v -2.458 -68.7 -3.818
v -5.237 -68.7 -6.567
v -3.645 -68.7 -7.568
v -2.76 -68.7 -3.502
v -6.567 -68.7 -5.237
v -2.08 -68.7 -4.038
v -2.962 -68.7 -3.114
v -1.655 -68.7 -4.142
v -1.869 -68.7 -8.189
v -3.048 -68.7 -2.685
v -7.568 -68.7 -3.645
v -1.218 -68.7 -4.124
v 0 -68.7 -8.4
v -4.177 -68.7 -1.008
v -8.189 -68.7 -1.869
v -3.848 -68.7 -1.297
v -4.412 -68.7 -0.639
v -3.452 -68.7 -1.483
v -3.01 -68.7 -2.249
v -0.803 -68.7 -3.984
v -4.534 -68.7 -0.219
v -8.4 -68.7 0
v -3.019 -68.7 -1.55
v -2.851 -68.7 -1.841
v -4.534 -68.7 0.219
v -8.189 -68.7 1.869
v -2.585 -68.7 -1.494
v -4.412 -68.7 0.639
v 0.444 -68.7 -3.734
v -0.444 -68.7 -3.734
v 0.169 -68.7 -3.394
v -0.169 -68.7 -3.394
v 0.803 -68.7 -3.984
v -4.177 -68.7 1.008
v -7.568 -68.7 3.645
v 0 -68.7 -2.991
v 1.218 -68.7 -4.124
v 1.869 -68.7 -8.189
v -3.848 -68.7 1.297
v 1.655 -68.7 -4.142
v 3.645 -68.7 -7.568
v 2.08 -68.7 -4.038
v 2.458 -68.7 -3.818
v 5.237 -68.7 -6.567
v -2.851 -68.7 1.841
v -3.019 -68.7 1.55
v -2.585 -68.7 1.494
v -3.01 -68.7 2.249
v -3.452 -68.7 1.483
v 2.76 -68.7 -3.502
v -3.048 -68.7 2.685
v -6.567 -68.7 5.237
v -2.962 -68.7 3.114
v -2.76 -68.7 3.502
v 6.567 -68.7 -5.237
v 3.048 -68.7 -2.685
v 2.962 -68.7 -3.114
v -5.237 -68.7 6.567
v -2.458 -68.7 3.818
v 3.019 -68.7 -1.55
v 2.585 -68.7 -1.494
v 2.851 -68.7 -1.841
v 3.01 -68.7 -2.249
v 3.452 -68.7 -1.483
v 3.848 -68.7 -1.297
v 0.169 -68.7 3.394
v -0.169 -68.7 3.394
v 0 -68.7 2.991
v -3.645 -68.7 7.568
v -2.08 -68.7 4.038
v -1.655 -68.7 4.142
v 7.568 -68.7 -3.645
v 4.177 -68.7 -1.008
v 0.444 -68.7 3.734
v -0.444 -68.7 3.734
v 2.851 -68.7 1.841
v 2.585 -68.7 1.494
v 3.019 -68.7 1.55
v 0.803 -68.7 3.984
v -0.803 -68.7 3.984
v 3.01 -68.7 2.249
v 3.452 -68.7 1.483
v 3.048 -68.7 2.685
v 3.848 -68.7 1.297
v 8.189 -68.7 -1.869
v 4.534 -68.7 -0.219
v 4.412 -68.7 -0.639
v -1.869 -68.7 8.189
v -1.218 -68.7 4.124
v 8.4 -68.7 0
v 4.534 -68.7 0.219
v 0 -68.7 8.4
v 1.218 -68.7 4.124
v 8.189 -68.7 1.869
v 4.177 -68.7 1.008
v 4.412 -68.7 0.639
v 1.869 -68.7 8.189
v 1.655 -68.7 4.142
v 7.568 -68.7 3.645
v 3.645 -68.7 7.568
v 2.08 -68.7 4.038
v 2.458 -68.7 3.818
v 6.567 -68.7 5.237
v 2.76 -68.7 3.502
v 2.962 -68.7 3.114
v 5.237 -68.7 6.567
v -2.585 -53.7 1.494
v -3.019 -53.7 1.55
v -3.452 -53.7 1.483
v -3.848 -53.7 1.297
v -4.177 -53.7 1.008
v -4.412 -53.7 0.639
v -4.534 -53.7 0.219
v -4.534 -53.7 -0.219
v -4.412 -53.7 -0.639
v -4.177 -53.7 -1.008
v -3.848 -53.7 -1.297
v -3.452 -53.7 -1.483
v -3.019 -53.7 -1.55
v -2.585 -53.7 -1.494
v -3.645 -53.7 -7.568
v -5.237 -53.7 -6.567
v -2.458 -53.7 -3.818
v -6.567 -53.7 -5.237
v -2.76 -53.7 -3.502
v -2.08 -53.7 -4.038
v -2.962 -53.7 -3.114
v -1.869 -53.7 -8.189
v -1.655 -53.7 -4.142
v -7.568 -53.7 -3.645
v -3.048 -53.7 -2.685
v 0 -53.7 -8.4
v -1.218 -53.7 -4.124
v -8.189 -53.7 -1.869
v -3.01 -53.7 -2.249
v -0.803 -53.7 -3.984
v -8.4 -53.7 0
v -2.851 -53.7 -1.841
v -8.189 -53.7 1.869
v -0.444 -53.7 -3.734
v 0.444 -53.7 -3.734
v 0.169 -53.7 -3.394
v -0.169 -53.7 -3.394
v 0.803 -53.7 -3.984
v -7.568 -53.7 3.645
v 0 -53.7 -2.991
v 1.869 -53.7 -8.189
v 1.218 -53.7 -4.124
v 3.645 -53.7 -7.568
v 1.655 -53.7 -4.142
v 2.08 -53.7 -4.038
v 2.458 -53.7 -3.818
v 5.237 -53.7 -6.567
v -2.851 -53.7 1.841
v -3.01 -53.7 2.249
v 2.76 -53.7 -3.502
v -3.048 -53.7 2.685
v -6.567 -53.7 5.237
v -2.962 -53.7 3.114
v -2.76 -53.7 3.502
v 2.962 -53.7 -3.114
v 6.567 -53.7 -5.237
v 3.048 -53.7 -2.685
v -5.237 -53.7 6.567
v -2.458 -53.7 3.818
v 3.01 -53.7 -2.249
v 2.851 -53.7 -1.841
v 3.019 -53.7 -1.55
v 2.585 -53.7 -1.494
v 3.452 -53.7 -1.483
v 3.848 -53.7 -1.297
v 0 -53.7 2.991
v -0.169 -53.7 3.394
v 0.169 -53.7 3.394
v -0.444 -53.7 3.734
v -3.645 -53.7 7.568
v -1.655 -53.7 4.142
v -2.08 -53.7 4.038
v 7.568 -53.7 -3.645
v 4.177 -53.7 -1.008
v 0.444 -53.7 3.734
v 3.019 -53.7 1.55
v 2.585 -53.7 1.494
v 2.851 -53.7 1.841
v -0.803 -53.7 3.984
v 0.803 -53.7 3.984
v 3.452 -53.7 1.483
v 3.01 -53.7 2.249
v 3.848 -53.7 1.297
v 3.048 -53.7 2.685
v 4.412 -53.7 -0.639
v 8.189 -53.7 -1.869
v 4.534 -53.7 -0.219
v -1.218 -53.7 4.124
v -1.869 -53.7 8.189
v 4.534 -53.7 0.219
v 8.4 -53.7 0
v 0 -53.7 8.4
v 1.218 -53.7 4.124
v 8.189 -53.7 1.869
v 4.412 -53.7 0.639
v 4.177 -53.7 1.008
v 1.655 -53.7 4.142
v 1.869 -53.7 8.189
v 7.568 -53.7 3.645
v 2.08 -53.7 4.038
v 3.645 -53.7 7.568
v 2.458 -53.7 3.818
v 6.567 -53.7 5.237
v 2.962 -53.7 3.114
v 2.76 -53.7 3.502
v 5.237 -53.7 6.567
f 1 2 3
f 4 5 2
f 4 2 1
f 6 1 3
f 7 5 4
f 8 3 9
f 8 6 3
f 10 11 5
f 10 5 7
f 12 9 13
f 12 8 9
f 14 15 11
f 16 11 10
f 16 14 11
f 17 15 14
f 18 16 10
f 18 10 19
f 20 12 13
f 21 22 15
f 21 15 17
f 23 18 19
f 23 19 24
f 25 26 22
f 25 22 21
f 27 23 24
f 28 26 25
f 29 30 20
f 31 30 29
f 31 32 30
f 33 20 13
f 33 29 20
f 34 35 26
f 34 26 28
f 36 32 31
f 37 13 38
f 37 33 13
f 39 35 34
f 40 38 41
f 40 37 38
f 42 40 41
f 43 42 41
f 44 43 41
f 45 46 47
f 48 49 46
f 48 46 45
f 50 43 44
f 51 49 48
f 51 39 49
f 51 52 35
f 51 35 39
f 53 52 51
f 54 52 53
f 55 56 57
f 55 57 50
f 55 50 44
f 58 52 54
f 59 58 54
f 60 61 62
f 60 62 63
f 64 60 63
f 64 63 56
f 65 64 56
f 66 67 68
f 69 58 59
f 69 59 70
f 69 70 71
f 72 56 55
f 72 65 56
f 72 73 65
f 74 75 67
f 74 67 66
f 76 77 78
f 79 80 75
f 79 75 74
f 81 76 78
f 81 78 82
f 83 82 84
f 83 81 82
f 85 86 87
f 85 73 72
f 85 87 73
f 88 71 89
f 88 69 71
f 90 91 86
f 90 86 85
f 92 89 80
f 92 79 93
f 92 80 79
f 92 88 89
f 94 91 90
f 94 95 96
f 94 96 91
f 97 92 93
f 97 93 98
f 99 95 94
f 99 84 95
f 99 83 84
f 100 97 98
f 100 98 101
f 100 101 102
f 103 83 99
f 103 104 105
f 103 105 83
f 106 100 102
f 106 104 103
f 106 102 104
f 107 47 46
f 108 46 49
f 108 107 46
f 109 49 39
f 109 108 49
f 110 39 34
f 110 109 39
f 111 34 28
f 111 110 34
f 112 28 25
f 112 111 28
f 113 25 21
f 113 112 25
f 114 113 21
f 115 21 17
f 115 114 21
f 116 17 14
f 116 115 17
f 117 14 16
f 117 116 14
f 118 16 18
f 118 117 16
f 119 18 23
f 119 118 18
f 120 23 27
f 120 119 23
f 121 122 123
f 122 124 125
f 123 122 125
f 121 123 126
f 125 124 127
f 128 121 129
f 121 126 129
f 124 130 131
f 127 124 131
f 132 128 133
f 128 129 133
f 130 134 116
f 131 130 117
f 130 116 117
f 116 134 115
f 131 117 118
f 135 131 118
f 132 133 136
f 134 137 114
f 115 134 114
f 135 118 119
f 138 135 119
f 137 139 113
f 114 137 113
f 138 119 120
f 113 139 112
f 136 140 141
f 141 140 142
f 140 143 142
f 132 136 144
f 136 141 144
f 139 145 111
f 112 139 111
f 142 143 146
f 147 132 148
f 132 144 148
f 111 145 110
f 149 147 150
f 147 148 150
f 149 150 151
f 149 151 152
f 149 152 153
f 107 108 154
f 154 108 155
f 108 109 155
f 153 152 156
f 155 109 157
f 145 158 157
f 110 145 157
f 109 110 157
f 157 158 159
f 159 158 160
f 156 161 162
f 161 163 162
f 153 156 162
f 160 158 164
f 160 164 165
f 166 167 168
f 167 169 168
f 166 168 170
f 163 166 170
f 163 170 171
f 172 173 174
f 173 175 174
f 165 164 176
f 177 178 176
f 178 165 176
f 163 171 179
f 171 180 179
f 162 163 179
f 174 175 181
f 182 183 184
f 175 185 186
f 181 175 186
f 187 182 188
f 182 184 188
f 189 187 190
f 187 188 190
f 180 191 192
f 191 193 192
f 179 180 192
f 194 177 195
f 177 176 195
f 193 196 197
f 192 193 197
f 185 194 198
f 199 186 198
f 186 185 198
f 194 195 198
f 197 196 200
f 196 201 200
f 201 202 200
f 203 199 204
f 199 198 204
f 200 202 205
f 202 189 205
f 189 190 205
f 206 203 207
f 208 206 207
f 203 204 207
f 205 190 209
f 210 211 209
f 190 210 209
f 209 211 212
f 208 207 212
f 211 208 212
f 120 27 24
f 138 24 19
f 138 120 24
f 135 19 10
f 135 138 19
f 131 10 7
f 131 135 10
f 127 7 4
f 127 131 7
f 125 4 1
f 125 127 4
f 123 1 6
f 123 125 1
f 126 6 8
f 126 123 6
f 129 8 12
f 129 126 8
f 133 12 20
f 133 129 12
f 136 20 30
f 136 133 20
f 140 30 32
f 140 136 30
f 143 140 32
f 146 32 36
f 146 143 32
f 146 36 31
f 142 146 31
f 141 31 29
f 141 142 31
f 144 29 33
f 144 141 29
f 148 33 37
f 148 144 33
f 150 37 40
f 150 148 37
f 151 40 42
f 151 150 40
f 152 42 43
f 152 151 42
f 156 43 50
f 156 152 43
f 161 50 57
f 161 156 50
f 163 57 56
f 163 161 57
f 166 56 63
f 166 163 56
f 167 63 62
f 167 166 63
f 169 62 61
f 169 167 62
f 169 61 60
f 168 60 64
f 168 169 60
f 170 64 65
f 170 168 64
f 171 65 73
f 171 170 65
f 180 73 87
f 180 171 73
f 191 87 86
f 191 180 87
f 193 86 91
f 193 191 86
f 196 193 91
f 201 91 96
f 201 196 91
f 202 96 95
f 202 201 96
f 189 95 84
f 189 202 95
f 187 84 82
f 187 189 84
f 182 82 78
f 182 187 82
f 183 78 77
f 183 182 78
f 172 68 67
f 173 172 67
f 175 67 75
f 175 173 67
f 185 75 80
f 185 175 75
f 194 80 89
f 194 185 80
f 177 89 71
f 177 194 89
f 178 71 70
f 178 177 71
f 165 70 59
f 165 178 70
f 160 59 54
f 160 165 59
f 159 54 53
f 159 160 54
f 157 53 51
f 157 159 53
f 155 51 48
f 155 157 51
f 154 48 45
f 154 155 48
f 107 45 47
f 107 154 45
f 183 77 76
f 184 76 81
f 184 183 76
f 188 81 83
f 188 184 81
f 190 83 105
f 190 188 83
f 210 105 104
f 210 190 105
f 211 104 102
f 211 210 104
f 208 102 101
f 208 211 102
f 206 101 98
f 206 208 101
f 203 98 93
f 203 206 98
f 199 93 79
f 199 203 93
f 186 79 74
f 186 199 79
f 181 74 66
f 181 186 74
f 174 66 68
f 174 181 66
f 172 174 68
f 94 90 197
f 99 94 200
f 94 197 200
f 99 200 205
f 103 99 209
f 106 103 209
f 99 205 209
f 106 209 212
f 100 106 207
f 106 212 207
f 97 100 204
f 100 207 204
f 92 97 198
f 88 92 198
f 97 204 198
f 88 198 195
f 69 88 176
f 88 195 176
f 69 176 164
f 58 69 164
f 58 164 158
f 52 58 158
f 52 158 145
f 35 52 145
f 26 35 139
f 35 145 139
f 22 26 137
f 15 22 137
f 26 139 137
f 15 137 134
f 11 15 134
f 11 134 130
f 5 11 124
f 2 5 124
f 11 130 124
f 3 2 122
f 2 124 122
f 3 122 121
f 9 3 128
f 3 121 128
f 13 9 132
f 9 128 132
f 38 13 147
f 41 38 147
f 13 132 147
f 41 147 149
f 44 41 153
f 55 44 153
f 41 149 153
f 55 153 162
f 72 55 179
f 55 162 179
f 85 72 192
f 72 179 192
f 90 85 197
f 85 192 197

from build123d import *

# Parameters (mm, degrees)
CYLINDER002_R          = 2.5
CYLINDER002_DEPTH      = 17
CYLINDER003_R          = 1.55
CYLINDER003_DEPTH      = 17
CYLINDER004_R          = 1.55
CYLINDER004_DEPTH      = 17
CYLINDER005_R          = 1.55
CYLINDER005_DEPTH      = 17
CYLINDER006_R          = 1.55
CYLINDER006_DEPTH      = 17
CYLINDER007_R          = 1.55
CYLINDER007_DEPTH      = 17
CYLINDER001_R          = 1.55
CYLINDER001_DEPTH      = 17
SKETCH019_R            = 8.4
PAD010_DEPTH           = 15
CUT009_PLACEMENT_ANGLE = 90


with BuildPart() as fibre002:
    # Cylinder002 → Cylinder002 (new body)
    with BuildSketch(Plane.XY):
        Circle(CYLINDER002_R)
    extrude(amount=CYLINDER002_DEPTH)


with BuildPart() as fibre003:
    # Cylinder003 → Cylinder003 (new body)
    with BuildSketch(Plane(origin=(1.5, -2.6, 0), x_dir=(1, 0, 0), z_dir=(0, 0, 1))):
        Circle(CYLINDER003_R)
    extrude(amount=CYLINDER003_DEPTH)


with BuildPart() as fibre004:
    # Cylinder004 → Cylinder004 (new body)
    with BuildSketch(Plane(origin=(3, 0, 0), x_dir=(1, 0, 0), z_dir=(0, 0, 1))):
        Circle(CYLINDER004_R)
    extrude(amount=CYLINDER004_DEPTH)


with BuildPart() as fibre005:
    # Cylinder005 → Cylinder005 (new body)
    with BuildSketch(Plane(origin=(-3, 0, 0), x_dir=(1, 0, 0), z_dir=(0, 0, 1))):
        Circle(CYLINDER005_R)
    extrude(amount=CYLINDER005_DEPTH)


with BuildPart() as fibre006:
    # Cylinder006 → Cylinder006 (new body)
    with BuildSketch(Plane(origin=(-1.5, 2.6, 0), x_dir=(1, 0, 0), z_dir=(0, 0, 1))):
        Circle(CYLINDER006_R)
    extrude(amount=CYLINDER006_DEPTH)


with BuildPart() as fibre007:
    # Cylinder007 → Cylinder007 (new body)
    with BuildSketch(Plane(origin=(-1.5, -2.6, 0), x_dir=(1, 0, 0), z_dir=(0, 0, 1))):
        Circle(CYLINDER007_R)
    extrude(amount=CYLINDER007_DEPTH)


with BuildPart() as fibres:
    # Cylinder001 → Cylinder001 (new body)
    with BuildSketch(Plane(origin=(1.5, 2.6, 0), x_dir=(1, 0, 0), z_dir=(0, 0, 1))):
        Circle(CYLINDER001_R)
    extrude(amount=CYLINDER001_DEPTH)

    # Fusion: union Fibre002, Fibre003, Fibre004, Fibre005, Fibre006, Fibre007
    add(fibre002.part)
    add(fibre003.part)
    add(fibre004.part)
    add(fibre005.part)
    add(fibre006.part)
    add(fibre007.part)


with BuildPart() as fibresholder:
    # Sketch019 → Pad010 (new body)
    with BuildSketch(Plane.XY):
        Circle(SKETCH019_R)
    extrude(amount=PAD010_DEPTH)

    # Cut009: cut Fibres
    add(fibres.part, mode=Mode.SUBTRACT)


with BuildPart() as fibresholder_1:
    # Cut009 placement: moved
    add(fibresholder.part.moved(Location((0, -53.7, 0))).rotate(Axis((0, -53.7, 0), (1, 0, 0)), CUT009_PLACEMENT_ANGLE))


solid = fibresholder_1.part
